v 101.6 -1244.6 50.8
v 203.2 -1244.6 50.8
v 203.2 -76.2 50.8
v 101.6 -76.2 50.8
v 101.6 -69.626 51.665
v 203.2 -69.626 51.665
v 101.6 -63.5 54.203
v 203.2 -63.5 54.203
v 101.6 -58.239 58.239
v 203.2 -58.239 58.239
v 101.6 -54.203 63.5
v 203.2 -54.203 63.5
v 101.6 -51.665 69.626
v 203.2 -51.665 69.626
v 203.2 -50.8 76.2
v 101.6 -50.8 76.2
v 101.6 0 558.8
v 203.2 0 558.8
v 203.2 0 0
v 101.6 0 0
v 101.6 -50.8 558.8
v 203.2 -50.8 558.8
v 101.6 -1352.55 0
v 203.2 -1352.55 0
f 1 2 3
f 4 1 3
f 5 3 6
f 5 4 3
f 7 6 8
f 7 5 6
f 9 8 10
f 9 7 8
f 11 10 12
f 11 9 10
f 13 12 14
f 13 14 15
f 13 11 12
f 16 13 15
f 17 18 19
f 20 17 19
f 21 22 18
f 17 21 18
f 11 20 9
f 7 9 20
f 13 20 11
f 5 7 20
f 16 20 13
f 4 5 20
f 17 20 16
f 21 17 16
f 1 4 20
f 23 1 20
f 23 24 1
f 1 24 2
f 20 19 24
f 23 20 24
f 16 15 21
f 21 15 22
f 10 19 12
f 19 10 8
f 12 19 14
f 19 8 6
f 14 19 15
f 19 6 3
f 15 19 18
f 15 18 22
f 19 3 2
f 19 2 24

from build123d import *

# Parameters (mm, degrees)
F1_DEPTH = 101.6
F2_R     = 25.4
F3_R     = 25.4
F4_DEPTH = 101.6
F5_ANGLE = 180


# Not quite as in the source:
# - a feature names something its author has since deleted; it is built from what else it names


with BuildPart() as f1:
    # F0 (on Right) → F1 (new body)
    with BuildSketch(Plane.YZ):
        Polygon((0, 38.1), (0, 0), (1352.55, 0), (1244.6, 50.8), (50.8, 50.8), (50.8, 558.8), (0, 558.8), align=None)
    extrude(amount=F1_DEPTH)

    # F2
    f2_edges = [f1.edges().sort_by_distance(p)[0] for p in [
        (50.8, 0, 0),
    ]]
    fillet(f2_edges, radius=F2_R)

    # F3
    f3_edges = [f1.edges().sort_by_distance(p)[0] for p in [
        (50.8, 50.8, 50.8),
    ]]
    fillet(f3_edges, radius=F3_R)

    # F0 (on Right) → F4 (join)
    with BuildSketch(Plane.YZ):
        Polygon((0, 38.1), (0, 0), (1352.55, 0), (1244.6, 50.8), (50.8, 50.8), (50.8, 558.8), (0, 558.8), align=None)
    extrude(amount=F4_DEPTH)


with BuildPart() as f1_1:
    # F5: moved
    add(f1.part.rotate(Axis((101.6, 0, 279.4), (0, 0, 1)), F5_ANGLE))


solid = f1_1.part
